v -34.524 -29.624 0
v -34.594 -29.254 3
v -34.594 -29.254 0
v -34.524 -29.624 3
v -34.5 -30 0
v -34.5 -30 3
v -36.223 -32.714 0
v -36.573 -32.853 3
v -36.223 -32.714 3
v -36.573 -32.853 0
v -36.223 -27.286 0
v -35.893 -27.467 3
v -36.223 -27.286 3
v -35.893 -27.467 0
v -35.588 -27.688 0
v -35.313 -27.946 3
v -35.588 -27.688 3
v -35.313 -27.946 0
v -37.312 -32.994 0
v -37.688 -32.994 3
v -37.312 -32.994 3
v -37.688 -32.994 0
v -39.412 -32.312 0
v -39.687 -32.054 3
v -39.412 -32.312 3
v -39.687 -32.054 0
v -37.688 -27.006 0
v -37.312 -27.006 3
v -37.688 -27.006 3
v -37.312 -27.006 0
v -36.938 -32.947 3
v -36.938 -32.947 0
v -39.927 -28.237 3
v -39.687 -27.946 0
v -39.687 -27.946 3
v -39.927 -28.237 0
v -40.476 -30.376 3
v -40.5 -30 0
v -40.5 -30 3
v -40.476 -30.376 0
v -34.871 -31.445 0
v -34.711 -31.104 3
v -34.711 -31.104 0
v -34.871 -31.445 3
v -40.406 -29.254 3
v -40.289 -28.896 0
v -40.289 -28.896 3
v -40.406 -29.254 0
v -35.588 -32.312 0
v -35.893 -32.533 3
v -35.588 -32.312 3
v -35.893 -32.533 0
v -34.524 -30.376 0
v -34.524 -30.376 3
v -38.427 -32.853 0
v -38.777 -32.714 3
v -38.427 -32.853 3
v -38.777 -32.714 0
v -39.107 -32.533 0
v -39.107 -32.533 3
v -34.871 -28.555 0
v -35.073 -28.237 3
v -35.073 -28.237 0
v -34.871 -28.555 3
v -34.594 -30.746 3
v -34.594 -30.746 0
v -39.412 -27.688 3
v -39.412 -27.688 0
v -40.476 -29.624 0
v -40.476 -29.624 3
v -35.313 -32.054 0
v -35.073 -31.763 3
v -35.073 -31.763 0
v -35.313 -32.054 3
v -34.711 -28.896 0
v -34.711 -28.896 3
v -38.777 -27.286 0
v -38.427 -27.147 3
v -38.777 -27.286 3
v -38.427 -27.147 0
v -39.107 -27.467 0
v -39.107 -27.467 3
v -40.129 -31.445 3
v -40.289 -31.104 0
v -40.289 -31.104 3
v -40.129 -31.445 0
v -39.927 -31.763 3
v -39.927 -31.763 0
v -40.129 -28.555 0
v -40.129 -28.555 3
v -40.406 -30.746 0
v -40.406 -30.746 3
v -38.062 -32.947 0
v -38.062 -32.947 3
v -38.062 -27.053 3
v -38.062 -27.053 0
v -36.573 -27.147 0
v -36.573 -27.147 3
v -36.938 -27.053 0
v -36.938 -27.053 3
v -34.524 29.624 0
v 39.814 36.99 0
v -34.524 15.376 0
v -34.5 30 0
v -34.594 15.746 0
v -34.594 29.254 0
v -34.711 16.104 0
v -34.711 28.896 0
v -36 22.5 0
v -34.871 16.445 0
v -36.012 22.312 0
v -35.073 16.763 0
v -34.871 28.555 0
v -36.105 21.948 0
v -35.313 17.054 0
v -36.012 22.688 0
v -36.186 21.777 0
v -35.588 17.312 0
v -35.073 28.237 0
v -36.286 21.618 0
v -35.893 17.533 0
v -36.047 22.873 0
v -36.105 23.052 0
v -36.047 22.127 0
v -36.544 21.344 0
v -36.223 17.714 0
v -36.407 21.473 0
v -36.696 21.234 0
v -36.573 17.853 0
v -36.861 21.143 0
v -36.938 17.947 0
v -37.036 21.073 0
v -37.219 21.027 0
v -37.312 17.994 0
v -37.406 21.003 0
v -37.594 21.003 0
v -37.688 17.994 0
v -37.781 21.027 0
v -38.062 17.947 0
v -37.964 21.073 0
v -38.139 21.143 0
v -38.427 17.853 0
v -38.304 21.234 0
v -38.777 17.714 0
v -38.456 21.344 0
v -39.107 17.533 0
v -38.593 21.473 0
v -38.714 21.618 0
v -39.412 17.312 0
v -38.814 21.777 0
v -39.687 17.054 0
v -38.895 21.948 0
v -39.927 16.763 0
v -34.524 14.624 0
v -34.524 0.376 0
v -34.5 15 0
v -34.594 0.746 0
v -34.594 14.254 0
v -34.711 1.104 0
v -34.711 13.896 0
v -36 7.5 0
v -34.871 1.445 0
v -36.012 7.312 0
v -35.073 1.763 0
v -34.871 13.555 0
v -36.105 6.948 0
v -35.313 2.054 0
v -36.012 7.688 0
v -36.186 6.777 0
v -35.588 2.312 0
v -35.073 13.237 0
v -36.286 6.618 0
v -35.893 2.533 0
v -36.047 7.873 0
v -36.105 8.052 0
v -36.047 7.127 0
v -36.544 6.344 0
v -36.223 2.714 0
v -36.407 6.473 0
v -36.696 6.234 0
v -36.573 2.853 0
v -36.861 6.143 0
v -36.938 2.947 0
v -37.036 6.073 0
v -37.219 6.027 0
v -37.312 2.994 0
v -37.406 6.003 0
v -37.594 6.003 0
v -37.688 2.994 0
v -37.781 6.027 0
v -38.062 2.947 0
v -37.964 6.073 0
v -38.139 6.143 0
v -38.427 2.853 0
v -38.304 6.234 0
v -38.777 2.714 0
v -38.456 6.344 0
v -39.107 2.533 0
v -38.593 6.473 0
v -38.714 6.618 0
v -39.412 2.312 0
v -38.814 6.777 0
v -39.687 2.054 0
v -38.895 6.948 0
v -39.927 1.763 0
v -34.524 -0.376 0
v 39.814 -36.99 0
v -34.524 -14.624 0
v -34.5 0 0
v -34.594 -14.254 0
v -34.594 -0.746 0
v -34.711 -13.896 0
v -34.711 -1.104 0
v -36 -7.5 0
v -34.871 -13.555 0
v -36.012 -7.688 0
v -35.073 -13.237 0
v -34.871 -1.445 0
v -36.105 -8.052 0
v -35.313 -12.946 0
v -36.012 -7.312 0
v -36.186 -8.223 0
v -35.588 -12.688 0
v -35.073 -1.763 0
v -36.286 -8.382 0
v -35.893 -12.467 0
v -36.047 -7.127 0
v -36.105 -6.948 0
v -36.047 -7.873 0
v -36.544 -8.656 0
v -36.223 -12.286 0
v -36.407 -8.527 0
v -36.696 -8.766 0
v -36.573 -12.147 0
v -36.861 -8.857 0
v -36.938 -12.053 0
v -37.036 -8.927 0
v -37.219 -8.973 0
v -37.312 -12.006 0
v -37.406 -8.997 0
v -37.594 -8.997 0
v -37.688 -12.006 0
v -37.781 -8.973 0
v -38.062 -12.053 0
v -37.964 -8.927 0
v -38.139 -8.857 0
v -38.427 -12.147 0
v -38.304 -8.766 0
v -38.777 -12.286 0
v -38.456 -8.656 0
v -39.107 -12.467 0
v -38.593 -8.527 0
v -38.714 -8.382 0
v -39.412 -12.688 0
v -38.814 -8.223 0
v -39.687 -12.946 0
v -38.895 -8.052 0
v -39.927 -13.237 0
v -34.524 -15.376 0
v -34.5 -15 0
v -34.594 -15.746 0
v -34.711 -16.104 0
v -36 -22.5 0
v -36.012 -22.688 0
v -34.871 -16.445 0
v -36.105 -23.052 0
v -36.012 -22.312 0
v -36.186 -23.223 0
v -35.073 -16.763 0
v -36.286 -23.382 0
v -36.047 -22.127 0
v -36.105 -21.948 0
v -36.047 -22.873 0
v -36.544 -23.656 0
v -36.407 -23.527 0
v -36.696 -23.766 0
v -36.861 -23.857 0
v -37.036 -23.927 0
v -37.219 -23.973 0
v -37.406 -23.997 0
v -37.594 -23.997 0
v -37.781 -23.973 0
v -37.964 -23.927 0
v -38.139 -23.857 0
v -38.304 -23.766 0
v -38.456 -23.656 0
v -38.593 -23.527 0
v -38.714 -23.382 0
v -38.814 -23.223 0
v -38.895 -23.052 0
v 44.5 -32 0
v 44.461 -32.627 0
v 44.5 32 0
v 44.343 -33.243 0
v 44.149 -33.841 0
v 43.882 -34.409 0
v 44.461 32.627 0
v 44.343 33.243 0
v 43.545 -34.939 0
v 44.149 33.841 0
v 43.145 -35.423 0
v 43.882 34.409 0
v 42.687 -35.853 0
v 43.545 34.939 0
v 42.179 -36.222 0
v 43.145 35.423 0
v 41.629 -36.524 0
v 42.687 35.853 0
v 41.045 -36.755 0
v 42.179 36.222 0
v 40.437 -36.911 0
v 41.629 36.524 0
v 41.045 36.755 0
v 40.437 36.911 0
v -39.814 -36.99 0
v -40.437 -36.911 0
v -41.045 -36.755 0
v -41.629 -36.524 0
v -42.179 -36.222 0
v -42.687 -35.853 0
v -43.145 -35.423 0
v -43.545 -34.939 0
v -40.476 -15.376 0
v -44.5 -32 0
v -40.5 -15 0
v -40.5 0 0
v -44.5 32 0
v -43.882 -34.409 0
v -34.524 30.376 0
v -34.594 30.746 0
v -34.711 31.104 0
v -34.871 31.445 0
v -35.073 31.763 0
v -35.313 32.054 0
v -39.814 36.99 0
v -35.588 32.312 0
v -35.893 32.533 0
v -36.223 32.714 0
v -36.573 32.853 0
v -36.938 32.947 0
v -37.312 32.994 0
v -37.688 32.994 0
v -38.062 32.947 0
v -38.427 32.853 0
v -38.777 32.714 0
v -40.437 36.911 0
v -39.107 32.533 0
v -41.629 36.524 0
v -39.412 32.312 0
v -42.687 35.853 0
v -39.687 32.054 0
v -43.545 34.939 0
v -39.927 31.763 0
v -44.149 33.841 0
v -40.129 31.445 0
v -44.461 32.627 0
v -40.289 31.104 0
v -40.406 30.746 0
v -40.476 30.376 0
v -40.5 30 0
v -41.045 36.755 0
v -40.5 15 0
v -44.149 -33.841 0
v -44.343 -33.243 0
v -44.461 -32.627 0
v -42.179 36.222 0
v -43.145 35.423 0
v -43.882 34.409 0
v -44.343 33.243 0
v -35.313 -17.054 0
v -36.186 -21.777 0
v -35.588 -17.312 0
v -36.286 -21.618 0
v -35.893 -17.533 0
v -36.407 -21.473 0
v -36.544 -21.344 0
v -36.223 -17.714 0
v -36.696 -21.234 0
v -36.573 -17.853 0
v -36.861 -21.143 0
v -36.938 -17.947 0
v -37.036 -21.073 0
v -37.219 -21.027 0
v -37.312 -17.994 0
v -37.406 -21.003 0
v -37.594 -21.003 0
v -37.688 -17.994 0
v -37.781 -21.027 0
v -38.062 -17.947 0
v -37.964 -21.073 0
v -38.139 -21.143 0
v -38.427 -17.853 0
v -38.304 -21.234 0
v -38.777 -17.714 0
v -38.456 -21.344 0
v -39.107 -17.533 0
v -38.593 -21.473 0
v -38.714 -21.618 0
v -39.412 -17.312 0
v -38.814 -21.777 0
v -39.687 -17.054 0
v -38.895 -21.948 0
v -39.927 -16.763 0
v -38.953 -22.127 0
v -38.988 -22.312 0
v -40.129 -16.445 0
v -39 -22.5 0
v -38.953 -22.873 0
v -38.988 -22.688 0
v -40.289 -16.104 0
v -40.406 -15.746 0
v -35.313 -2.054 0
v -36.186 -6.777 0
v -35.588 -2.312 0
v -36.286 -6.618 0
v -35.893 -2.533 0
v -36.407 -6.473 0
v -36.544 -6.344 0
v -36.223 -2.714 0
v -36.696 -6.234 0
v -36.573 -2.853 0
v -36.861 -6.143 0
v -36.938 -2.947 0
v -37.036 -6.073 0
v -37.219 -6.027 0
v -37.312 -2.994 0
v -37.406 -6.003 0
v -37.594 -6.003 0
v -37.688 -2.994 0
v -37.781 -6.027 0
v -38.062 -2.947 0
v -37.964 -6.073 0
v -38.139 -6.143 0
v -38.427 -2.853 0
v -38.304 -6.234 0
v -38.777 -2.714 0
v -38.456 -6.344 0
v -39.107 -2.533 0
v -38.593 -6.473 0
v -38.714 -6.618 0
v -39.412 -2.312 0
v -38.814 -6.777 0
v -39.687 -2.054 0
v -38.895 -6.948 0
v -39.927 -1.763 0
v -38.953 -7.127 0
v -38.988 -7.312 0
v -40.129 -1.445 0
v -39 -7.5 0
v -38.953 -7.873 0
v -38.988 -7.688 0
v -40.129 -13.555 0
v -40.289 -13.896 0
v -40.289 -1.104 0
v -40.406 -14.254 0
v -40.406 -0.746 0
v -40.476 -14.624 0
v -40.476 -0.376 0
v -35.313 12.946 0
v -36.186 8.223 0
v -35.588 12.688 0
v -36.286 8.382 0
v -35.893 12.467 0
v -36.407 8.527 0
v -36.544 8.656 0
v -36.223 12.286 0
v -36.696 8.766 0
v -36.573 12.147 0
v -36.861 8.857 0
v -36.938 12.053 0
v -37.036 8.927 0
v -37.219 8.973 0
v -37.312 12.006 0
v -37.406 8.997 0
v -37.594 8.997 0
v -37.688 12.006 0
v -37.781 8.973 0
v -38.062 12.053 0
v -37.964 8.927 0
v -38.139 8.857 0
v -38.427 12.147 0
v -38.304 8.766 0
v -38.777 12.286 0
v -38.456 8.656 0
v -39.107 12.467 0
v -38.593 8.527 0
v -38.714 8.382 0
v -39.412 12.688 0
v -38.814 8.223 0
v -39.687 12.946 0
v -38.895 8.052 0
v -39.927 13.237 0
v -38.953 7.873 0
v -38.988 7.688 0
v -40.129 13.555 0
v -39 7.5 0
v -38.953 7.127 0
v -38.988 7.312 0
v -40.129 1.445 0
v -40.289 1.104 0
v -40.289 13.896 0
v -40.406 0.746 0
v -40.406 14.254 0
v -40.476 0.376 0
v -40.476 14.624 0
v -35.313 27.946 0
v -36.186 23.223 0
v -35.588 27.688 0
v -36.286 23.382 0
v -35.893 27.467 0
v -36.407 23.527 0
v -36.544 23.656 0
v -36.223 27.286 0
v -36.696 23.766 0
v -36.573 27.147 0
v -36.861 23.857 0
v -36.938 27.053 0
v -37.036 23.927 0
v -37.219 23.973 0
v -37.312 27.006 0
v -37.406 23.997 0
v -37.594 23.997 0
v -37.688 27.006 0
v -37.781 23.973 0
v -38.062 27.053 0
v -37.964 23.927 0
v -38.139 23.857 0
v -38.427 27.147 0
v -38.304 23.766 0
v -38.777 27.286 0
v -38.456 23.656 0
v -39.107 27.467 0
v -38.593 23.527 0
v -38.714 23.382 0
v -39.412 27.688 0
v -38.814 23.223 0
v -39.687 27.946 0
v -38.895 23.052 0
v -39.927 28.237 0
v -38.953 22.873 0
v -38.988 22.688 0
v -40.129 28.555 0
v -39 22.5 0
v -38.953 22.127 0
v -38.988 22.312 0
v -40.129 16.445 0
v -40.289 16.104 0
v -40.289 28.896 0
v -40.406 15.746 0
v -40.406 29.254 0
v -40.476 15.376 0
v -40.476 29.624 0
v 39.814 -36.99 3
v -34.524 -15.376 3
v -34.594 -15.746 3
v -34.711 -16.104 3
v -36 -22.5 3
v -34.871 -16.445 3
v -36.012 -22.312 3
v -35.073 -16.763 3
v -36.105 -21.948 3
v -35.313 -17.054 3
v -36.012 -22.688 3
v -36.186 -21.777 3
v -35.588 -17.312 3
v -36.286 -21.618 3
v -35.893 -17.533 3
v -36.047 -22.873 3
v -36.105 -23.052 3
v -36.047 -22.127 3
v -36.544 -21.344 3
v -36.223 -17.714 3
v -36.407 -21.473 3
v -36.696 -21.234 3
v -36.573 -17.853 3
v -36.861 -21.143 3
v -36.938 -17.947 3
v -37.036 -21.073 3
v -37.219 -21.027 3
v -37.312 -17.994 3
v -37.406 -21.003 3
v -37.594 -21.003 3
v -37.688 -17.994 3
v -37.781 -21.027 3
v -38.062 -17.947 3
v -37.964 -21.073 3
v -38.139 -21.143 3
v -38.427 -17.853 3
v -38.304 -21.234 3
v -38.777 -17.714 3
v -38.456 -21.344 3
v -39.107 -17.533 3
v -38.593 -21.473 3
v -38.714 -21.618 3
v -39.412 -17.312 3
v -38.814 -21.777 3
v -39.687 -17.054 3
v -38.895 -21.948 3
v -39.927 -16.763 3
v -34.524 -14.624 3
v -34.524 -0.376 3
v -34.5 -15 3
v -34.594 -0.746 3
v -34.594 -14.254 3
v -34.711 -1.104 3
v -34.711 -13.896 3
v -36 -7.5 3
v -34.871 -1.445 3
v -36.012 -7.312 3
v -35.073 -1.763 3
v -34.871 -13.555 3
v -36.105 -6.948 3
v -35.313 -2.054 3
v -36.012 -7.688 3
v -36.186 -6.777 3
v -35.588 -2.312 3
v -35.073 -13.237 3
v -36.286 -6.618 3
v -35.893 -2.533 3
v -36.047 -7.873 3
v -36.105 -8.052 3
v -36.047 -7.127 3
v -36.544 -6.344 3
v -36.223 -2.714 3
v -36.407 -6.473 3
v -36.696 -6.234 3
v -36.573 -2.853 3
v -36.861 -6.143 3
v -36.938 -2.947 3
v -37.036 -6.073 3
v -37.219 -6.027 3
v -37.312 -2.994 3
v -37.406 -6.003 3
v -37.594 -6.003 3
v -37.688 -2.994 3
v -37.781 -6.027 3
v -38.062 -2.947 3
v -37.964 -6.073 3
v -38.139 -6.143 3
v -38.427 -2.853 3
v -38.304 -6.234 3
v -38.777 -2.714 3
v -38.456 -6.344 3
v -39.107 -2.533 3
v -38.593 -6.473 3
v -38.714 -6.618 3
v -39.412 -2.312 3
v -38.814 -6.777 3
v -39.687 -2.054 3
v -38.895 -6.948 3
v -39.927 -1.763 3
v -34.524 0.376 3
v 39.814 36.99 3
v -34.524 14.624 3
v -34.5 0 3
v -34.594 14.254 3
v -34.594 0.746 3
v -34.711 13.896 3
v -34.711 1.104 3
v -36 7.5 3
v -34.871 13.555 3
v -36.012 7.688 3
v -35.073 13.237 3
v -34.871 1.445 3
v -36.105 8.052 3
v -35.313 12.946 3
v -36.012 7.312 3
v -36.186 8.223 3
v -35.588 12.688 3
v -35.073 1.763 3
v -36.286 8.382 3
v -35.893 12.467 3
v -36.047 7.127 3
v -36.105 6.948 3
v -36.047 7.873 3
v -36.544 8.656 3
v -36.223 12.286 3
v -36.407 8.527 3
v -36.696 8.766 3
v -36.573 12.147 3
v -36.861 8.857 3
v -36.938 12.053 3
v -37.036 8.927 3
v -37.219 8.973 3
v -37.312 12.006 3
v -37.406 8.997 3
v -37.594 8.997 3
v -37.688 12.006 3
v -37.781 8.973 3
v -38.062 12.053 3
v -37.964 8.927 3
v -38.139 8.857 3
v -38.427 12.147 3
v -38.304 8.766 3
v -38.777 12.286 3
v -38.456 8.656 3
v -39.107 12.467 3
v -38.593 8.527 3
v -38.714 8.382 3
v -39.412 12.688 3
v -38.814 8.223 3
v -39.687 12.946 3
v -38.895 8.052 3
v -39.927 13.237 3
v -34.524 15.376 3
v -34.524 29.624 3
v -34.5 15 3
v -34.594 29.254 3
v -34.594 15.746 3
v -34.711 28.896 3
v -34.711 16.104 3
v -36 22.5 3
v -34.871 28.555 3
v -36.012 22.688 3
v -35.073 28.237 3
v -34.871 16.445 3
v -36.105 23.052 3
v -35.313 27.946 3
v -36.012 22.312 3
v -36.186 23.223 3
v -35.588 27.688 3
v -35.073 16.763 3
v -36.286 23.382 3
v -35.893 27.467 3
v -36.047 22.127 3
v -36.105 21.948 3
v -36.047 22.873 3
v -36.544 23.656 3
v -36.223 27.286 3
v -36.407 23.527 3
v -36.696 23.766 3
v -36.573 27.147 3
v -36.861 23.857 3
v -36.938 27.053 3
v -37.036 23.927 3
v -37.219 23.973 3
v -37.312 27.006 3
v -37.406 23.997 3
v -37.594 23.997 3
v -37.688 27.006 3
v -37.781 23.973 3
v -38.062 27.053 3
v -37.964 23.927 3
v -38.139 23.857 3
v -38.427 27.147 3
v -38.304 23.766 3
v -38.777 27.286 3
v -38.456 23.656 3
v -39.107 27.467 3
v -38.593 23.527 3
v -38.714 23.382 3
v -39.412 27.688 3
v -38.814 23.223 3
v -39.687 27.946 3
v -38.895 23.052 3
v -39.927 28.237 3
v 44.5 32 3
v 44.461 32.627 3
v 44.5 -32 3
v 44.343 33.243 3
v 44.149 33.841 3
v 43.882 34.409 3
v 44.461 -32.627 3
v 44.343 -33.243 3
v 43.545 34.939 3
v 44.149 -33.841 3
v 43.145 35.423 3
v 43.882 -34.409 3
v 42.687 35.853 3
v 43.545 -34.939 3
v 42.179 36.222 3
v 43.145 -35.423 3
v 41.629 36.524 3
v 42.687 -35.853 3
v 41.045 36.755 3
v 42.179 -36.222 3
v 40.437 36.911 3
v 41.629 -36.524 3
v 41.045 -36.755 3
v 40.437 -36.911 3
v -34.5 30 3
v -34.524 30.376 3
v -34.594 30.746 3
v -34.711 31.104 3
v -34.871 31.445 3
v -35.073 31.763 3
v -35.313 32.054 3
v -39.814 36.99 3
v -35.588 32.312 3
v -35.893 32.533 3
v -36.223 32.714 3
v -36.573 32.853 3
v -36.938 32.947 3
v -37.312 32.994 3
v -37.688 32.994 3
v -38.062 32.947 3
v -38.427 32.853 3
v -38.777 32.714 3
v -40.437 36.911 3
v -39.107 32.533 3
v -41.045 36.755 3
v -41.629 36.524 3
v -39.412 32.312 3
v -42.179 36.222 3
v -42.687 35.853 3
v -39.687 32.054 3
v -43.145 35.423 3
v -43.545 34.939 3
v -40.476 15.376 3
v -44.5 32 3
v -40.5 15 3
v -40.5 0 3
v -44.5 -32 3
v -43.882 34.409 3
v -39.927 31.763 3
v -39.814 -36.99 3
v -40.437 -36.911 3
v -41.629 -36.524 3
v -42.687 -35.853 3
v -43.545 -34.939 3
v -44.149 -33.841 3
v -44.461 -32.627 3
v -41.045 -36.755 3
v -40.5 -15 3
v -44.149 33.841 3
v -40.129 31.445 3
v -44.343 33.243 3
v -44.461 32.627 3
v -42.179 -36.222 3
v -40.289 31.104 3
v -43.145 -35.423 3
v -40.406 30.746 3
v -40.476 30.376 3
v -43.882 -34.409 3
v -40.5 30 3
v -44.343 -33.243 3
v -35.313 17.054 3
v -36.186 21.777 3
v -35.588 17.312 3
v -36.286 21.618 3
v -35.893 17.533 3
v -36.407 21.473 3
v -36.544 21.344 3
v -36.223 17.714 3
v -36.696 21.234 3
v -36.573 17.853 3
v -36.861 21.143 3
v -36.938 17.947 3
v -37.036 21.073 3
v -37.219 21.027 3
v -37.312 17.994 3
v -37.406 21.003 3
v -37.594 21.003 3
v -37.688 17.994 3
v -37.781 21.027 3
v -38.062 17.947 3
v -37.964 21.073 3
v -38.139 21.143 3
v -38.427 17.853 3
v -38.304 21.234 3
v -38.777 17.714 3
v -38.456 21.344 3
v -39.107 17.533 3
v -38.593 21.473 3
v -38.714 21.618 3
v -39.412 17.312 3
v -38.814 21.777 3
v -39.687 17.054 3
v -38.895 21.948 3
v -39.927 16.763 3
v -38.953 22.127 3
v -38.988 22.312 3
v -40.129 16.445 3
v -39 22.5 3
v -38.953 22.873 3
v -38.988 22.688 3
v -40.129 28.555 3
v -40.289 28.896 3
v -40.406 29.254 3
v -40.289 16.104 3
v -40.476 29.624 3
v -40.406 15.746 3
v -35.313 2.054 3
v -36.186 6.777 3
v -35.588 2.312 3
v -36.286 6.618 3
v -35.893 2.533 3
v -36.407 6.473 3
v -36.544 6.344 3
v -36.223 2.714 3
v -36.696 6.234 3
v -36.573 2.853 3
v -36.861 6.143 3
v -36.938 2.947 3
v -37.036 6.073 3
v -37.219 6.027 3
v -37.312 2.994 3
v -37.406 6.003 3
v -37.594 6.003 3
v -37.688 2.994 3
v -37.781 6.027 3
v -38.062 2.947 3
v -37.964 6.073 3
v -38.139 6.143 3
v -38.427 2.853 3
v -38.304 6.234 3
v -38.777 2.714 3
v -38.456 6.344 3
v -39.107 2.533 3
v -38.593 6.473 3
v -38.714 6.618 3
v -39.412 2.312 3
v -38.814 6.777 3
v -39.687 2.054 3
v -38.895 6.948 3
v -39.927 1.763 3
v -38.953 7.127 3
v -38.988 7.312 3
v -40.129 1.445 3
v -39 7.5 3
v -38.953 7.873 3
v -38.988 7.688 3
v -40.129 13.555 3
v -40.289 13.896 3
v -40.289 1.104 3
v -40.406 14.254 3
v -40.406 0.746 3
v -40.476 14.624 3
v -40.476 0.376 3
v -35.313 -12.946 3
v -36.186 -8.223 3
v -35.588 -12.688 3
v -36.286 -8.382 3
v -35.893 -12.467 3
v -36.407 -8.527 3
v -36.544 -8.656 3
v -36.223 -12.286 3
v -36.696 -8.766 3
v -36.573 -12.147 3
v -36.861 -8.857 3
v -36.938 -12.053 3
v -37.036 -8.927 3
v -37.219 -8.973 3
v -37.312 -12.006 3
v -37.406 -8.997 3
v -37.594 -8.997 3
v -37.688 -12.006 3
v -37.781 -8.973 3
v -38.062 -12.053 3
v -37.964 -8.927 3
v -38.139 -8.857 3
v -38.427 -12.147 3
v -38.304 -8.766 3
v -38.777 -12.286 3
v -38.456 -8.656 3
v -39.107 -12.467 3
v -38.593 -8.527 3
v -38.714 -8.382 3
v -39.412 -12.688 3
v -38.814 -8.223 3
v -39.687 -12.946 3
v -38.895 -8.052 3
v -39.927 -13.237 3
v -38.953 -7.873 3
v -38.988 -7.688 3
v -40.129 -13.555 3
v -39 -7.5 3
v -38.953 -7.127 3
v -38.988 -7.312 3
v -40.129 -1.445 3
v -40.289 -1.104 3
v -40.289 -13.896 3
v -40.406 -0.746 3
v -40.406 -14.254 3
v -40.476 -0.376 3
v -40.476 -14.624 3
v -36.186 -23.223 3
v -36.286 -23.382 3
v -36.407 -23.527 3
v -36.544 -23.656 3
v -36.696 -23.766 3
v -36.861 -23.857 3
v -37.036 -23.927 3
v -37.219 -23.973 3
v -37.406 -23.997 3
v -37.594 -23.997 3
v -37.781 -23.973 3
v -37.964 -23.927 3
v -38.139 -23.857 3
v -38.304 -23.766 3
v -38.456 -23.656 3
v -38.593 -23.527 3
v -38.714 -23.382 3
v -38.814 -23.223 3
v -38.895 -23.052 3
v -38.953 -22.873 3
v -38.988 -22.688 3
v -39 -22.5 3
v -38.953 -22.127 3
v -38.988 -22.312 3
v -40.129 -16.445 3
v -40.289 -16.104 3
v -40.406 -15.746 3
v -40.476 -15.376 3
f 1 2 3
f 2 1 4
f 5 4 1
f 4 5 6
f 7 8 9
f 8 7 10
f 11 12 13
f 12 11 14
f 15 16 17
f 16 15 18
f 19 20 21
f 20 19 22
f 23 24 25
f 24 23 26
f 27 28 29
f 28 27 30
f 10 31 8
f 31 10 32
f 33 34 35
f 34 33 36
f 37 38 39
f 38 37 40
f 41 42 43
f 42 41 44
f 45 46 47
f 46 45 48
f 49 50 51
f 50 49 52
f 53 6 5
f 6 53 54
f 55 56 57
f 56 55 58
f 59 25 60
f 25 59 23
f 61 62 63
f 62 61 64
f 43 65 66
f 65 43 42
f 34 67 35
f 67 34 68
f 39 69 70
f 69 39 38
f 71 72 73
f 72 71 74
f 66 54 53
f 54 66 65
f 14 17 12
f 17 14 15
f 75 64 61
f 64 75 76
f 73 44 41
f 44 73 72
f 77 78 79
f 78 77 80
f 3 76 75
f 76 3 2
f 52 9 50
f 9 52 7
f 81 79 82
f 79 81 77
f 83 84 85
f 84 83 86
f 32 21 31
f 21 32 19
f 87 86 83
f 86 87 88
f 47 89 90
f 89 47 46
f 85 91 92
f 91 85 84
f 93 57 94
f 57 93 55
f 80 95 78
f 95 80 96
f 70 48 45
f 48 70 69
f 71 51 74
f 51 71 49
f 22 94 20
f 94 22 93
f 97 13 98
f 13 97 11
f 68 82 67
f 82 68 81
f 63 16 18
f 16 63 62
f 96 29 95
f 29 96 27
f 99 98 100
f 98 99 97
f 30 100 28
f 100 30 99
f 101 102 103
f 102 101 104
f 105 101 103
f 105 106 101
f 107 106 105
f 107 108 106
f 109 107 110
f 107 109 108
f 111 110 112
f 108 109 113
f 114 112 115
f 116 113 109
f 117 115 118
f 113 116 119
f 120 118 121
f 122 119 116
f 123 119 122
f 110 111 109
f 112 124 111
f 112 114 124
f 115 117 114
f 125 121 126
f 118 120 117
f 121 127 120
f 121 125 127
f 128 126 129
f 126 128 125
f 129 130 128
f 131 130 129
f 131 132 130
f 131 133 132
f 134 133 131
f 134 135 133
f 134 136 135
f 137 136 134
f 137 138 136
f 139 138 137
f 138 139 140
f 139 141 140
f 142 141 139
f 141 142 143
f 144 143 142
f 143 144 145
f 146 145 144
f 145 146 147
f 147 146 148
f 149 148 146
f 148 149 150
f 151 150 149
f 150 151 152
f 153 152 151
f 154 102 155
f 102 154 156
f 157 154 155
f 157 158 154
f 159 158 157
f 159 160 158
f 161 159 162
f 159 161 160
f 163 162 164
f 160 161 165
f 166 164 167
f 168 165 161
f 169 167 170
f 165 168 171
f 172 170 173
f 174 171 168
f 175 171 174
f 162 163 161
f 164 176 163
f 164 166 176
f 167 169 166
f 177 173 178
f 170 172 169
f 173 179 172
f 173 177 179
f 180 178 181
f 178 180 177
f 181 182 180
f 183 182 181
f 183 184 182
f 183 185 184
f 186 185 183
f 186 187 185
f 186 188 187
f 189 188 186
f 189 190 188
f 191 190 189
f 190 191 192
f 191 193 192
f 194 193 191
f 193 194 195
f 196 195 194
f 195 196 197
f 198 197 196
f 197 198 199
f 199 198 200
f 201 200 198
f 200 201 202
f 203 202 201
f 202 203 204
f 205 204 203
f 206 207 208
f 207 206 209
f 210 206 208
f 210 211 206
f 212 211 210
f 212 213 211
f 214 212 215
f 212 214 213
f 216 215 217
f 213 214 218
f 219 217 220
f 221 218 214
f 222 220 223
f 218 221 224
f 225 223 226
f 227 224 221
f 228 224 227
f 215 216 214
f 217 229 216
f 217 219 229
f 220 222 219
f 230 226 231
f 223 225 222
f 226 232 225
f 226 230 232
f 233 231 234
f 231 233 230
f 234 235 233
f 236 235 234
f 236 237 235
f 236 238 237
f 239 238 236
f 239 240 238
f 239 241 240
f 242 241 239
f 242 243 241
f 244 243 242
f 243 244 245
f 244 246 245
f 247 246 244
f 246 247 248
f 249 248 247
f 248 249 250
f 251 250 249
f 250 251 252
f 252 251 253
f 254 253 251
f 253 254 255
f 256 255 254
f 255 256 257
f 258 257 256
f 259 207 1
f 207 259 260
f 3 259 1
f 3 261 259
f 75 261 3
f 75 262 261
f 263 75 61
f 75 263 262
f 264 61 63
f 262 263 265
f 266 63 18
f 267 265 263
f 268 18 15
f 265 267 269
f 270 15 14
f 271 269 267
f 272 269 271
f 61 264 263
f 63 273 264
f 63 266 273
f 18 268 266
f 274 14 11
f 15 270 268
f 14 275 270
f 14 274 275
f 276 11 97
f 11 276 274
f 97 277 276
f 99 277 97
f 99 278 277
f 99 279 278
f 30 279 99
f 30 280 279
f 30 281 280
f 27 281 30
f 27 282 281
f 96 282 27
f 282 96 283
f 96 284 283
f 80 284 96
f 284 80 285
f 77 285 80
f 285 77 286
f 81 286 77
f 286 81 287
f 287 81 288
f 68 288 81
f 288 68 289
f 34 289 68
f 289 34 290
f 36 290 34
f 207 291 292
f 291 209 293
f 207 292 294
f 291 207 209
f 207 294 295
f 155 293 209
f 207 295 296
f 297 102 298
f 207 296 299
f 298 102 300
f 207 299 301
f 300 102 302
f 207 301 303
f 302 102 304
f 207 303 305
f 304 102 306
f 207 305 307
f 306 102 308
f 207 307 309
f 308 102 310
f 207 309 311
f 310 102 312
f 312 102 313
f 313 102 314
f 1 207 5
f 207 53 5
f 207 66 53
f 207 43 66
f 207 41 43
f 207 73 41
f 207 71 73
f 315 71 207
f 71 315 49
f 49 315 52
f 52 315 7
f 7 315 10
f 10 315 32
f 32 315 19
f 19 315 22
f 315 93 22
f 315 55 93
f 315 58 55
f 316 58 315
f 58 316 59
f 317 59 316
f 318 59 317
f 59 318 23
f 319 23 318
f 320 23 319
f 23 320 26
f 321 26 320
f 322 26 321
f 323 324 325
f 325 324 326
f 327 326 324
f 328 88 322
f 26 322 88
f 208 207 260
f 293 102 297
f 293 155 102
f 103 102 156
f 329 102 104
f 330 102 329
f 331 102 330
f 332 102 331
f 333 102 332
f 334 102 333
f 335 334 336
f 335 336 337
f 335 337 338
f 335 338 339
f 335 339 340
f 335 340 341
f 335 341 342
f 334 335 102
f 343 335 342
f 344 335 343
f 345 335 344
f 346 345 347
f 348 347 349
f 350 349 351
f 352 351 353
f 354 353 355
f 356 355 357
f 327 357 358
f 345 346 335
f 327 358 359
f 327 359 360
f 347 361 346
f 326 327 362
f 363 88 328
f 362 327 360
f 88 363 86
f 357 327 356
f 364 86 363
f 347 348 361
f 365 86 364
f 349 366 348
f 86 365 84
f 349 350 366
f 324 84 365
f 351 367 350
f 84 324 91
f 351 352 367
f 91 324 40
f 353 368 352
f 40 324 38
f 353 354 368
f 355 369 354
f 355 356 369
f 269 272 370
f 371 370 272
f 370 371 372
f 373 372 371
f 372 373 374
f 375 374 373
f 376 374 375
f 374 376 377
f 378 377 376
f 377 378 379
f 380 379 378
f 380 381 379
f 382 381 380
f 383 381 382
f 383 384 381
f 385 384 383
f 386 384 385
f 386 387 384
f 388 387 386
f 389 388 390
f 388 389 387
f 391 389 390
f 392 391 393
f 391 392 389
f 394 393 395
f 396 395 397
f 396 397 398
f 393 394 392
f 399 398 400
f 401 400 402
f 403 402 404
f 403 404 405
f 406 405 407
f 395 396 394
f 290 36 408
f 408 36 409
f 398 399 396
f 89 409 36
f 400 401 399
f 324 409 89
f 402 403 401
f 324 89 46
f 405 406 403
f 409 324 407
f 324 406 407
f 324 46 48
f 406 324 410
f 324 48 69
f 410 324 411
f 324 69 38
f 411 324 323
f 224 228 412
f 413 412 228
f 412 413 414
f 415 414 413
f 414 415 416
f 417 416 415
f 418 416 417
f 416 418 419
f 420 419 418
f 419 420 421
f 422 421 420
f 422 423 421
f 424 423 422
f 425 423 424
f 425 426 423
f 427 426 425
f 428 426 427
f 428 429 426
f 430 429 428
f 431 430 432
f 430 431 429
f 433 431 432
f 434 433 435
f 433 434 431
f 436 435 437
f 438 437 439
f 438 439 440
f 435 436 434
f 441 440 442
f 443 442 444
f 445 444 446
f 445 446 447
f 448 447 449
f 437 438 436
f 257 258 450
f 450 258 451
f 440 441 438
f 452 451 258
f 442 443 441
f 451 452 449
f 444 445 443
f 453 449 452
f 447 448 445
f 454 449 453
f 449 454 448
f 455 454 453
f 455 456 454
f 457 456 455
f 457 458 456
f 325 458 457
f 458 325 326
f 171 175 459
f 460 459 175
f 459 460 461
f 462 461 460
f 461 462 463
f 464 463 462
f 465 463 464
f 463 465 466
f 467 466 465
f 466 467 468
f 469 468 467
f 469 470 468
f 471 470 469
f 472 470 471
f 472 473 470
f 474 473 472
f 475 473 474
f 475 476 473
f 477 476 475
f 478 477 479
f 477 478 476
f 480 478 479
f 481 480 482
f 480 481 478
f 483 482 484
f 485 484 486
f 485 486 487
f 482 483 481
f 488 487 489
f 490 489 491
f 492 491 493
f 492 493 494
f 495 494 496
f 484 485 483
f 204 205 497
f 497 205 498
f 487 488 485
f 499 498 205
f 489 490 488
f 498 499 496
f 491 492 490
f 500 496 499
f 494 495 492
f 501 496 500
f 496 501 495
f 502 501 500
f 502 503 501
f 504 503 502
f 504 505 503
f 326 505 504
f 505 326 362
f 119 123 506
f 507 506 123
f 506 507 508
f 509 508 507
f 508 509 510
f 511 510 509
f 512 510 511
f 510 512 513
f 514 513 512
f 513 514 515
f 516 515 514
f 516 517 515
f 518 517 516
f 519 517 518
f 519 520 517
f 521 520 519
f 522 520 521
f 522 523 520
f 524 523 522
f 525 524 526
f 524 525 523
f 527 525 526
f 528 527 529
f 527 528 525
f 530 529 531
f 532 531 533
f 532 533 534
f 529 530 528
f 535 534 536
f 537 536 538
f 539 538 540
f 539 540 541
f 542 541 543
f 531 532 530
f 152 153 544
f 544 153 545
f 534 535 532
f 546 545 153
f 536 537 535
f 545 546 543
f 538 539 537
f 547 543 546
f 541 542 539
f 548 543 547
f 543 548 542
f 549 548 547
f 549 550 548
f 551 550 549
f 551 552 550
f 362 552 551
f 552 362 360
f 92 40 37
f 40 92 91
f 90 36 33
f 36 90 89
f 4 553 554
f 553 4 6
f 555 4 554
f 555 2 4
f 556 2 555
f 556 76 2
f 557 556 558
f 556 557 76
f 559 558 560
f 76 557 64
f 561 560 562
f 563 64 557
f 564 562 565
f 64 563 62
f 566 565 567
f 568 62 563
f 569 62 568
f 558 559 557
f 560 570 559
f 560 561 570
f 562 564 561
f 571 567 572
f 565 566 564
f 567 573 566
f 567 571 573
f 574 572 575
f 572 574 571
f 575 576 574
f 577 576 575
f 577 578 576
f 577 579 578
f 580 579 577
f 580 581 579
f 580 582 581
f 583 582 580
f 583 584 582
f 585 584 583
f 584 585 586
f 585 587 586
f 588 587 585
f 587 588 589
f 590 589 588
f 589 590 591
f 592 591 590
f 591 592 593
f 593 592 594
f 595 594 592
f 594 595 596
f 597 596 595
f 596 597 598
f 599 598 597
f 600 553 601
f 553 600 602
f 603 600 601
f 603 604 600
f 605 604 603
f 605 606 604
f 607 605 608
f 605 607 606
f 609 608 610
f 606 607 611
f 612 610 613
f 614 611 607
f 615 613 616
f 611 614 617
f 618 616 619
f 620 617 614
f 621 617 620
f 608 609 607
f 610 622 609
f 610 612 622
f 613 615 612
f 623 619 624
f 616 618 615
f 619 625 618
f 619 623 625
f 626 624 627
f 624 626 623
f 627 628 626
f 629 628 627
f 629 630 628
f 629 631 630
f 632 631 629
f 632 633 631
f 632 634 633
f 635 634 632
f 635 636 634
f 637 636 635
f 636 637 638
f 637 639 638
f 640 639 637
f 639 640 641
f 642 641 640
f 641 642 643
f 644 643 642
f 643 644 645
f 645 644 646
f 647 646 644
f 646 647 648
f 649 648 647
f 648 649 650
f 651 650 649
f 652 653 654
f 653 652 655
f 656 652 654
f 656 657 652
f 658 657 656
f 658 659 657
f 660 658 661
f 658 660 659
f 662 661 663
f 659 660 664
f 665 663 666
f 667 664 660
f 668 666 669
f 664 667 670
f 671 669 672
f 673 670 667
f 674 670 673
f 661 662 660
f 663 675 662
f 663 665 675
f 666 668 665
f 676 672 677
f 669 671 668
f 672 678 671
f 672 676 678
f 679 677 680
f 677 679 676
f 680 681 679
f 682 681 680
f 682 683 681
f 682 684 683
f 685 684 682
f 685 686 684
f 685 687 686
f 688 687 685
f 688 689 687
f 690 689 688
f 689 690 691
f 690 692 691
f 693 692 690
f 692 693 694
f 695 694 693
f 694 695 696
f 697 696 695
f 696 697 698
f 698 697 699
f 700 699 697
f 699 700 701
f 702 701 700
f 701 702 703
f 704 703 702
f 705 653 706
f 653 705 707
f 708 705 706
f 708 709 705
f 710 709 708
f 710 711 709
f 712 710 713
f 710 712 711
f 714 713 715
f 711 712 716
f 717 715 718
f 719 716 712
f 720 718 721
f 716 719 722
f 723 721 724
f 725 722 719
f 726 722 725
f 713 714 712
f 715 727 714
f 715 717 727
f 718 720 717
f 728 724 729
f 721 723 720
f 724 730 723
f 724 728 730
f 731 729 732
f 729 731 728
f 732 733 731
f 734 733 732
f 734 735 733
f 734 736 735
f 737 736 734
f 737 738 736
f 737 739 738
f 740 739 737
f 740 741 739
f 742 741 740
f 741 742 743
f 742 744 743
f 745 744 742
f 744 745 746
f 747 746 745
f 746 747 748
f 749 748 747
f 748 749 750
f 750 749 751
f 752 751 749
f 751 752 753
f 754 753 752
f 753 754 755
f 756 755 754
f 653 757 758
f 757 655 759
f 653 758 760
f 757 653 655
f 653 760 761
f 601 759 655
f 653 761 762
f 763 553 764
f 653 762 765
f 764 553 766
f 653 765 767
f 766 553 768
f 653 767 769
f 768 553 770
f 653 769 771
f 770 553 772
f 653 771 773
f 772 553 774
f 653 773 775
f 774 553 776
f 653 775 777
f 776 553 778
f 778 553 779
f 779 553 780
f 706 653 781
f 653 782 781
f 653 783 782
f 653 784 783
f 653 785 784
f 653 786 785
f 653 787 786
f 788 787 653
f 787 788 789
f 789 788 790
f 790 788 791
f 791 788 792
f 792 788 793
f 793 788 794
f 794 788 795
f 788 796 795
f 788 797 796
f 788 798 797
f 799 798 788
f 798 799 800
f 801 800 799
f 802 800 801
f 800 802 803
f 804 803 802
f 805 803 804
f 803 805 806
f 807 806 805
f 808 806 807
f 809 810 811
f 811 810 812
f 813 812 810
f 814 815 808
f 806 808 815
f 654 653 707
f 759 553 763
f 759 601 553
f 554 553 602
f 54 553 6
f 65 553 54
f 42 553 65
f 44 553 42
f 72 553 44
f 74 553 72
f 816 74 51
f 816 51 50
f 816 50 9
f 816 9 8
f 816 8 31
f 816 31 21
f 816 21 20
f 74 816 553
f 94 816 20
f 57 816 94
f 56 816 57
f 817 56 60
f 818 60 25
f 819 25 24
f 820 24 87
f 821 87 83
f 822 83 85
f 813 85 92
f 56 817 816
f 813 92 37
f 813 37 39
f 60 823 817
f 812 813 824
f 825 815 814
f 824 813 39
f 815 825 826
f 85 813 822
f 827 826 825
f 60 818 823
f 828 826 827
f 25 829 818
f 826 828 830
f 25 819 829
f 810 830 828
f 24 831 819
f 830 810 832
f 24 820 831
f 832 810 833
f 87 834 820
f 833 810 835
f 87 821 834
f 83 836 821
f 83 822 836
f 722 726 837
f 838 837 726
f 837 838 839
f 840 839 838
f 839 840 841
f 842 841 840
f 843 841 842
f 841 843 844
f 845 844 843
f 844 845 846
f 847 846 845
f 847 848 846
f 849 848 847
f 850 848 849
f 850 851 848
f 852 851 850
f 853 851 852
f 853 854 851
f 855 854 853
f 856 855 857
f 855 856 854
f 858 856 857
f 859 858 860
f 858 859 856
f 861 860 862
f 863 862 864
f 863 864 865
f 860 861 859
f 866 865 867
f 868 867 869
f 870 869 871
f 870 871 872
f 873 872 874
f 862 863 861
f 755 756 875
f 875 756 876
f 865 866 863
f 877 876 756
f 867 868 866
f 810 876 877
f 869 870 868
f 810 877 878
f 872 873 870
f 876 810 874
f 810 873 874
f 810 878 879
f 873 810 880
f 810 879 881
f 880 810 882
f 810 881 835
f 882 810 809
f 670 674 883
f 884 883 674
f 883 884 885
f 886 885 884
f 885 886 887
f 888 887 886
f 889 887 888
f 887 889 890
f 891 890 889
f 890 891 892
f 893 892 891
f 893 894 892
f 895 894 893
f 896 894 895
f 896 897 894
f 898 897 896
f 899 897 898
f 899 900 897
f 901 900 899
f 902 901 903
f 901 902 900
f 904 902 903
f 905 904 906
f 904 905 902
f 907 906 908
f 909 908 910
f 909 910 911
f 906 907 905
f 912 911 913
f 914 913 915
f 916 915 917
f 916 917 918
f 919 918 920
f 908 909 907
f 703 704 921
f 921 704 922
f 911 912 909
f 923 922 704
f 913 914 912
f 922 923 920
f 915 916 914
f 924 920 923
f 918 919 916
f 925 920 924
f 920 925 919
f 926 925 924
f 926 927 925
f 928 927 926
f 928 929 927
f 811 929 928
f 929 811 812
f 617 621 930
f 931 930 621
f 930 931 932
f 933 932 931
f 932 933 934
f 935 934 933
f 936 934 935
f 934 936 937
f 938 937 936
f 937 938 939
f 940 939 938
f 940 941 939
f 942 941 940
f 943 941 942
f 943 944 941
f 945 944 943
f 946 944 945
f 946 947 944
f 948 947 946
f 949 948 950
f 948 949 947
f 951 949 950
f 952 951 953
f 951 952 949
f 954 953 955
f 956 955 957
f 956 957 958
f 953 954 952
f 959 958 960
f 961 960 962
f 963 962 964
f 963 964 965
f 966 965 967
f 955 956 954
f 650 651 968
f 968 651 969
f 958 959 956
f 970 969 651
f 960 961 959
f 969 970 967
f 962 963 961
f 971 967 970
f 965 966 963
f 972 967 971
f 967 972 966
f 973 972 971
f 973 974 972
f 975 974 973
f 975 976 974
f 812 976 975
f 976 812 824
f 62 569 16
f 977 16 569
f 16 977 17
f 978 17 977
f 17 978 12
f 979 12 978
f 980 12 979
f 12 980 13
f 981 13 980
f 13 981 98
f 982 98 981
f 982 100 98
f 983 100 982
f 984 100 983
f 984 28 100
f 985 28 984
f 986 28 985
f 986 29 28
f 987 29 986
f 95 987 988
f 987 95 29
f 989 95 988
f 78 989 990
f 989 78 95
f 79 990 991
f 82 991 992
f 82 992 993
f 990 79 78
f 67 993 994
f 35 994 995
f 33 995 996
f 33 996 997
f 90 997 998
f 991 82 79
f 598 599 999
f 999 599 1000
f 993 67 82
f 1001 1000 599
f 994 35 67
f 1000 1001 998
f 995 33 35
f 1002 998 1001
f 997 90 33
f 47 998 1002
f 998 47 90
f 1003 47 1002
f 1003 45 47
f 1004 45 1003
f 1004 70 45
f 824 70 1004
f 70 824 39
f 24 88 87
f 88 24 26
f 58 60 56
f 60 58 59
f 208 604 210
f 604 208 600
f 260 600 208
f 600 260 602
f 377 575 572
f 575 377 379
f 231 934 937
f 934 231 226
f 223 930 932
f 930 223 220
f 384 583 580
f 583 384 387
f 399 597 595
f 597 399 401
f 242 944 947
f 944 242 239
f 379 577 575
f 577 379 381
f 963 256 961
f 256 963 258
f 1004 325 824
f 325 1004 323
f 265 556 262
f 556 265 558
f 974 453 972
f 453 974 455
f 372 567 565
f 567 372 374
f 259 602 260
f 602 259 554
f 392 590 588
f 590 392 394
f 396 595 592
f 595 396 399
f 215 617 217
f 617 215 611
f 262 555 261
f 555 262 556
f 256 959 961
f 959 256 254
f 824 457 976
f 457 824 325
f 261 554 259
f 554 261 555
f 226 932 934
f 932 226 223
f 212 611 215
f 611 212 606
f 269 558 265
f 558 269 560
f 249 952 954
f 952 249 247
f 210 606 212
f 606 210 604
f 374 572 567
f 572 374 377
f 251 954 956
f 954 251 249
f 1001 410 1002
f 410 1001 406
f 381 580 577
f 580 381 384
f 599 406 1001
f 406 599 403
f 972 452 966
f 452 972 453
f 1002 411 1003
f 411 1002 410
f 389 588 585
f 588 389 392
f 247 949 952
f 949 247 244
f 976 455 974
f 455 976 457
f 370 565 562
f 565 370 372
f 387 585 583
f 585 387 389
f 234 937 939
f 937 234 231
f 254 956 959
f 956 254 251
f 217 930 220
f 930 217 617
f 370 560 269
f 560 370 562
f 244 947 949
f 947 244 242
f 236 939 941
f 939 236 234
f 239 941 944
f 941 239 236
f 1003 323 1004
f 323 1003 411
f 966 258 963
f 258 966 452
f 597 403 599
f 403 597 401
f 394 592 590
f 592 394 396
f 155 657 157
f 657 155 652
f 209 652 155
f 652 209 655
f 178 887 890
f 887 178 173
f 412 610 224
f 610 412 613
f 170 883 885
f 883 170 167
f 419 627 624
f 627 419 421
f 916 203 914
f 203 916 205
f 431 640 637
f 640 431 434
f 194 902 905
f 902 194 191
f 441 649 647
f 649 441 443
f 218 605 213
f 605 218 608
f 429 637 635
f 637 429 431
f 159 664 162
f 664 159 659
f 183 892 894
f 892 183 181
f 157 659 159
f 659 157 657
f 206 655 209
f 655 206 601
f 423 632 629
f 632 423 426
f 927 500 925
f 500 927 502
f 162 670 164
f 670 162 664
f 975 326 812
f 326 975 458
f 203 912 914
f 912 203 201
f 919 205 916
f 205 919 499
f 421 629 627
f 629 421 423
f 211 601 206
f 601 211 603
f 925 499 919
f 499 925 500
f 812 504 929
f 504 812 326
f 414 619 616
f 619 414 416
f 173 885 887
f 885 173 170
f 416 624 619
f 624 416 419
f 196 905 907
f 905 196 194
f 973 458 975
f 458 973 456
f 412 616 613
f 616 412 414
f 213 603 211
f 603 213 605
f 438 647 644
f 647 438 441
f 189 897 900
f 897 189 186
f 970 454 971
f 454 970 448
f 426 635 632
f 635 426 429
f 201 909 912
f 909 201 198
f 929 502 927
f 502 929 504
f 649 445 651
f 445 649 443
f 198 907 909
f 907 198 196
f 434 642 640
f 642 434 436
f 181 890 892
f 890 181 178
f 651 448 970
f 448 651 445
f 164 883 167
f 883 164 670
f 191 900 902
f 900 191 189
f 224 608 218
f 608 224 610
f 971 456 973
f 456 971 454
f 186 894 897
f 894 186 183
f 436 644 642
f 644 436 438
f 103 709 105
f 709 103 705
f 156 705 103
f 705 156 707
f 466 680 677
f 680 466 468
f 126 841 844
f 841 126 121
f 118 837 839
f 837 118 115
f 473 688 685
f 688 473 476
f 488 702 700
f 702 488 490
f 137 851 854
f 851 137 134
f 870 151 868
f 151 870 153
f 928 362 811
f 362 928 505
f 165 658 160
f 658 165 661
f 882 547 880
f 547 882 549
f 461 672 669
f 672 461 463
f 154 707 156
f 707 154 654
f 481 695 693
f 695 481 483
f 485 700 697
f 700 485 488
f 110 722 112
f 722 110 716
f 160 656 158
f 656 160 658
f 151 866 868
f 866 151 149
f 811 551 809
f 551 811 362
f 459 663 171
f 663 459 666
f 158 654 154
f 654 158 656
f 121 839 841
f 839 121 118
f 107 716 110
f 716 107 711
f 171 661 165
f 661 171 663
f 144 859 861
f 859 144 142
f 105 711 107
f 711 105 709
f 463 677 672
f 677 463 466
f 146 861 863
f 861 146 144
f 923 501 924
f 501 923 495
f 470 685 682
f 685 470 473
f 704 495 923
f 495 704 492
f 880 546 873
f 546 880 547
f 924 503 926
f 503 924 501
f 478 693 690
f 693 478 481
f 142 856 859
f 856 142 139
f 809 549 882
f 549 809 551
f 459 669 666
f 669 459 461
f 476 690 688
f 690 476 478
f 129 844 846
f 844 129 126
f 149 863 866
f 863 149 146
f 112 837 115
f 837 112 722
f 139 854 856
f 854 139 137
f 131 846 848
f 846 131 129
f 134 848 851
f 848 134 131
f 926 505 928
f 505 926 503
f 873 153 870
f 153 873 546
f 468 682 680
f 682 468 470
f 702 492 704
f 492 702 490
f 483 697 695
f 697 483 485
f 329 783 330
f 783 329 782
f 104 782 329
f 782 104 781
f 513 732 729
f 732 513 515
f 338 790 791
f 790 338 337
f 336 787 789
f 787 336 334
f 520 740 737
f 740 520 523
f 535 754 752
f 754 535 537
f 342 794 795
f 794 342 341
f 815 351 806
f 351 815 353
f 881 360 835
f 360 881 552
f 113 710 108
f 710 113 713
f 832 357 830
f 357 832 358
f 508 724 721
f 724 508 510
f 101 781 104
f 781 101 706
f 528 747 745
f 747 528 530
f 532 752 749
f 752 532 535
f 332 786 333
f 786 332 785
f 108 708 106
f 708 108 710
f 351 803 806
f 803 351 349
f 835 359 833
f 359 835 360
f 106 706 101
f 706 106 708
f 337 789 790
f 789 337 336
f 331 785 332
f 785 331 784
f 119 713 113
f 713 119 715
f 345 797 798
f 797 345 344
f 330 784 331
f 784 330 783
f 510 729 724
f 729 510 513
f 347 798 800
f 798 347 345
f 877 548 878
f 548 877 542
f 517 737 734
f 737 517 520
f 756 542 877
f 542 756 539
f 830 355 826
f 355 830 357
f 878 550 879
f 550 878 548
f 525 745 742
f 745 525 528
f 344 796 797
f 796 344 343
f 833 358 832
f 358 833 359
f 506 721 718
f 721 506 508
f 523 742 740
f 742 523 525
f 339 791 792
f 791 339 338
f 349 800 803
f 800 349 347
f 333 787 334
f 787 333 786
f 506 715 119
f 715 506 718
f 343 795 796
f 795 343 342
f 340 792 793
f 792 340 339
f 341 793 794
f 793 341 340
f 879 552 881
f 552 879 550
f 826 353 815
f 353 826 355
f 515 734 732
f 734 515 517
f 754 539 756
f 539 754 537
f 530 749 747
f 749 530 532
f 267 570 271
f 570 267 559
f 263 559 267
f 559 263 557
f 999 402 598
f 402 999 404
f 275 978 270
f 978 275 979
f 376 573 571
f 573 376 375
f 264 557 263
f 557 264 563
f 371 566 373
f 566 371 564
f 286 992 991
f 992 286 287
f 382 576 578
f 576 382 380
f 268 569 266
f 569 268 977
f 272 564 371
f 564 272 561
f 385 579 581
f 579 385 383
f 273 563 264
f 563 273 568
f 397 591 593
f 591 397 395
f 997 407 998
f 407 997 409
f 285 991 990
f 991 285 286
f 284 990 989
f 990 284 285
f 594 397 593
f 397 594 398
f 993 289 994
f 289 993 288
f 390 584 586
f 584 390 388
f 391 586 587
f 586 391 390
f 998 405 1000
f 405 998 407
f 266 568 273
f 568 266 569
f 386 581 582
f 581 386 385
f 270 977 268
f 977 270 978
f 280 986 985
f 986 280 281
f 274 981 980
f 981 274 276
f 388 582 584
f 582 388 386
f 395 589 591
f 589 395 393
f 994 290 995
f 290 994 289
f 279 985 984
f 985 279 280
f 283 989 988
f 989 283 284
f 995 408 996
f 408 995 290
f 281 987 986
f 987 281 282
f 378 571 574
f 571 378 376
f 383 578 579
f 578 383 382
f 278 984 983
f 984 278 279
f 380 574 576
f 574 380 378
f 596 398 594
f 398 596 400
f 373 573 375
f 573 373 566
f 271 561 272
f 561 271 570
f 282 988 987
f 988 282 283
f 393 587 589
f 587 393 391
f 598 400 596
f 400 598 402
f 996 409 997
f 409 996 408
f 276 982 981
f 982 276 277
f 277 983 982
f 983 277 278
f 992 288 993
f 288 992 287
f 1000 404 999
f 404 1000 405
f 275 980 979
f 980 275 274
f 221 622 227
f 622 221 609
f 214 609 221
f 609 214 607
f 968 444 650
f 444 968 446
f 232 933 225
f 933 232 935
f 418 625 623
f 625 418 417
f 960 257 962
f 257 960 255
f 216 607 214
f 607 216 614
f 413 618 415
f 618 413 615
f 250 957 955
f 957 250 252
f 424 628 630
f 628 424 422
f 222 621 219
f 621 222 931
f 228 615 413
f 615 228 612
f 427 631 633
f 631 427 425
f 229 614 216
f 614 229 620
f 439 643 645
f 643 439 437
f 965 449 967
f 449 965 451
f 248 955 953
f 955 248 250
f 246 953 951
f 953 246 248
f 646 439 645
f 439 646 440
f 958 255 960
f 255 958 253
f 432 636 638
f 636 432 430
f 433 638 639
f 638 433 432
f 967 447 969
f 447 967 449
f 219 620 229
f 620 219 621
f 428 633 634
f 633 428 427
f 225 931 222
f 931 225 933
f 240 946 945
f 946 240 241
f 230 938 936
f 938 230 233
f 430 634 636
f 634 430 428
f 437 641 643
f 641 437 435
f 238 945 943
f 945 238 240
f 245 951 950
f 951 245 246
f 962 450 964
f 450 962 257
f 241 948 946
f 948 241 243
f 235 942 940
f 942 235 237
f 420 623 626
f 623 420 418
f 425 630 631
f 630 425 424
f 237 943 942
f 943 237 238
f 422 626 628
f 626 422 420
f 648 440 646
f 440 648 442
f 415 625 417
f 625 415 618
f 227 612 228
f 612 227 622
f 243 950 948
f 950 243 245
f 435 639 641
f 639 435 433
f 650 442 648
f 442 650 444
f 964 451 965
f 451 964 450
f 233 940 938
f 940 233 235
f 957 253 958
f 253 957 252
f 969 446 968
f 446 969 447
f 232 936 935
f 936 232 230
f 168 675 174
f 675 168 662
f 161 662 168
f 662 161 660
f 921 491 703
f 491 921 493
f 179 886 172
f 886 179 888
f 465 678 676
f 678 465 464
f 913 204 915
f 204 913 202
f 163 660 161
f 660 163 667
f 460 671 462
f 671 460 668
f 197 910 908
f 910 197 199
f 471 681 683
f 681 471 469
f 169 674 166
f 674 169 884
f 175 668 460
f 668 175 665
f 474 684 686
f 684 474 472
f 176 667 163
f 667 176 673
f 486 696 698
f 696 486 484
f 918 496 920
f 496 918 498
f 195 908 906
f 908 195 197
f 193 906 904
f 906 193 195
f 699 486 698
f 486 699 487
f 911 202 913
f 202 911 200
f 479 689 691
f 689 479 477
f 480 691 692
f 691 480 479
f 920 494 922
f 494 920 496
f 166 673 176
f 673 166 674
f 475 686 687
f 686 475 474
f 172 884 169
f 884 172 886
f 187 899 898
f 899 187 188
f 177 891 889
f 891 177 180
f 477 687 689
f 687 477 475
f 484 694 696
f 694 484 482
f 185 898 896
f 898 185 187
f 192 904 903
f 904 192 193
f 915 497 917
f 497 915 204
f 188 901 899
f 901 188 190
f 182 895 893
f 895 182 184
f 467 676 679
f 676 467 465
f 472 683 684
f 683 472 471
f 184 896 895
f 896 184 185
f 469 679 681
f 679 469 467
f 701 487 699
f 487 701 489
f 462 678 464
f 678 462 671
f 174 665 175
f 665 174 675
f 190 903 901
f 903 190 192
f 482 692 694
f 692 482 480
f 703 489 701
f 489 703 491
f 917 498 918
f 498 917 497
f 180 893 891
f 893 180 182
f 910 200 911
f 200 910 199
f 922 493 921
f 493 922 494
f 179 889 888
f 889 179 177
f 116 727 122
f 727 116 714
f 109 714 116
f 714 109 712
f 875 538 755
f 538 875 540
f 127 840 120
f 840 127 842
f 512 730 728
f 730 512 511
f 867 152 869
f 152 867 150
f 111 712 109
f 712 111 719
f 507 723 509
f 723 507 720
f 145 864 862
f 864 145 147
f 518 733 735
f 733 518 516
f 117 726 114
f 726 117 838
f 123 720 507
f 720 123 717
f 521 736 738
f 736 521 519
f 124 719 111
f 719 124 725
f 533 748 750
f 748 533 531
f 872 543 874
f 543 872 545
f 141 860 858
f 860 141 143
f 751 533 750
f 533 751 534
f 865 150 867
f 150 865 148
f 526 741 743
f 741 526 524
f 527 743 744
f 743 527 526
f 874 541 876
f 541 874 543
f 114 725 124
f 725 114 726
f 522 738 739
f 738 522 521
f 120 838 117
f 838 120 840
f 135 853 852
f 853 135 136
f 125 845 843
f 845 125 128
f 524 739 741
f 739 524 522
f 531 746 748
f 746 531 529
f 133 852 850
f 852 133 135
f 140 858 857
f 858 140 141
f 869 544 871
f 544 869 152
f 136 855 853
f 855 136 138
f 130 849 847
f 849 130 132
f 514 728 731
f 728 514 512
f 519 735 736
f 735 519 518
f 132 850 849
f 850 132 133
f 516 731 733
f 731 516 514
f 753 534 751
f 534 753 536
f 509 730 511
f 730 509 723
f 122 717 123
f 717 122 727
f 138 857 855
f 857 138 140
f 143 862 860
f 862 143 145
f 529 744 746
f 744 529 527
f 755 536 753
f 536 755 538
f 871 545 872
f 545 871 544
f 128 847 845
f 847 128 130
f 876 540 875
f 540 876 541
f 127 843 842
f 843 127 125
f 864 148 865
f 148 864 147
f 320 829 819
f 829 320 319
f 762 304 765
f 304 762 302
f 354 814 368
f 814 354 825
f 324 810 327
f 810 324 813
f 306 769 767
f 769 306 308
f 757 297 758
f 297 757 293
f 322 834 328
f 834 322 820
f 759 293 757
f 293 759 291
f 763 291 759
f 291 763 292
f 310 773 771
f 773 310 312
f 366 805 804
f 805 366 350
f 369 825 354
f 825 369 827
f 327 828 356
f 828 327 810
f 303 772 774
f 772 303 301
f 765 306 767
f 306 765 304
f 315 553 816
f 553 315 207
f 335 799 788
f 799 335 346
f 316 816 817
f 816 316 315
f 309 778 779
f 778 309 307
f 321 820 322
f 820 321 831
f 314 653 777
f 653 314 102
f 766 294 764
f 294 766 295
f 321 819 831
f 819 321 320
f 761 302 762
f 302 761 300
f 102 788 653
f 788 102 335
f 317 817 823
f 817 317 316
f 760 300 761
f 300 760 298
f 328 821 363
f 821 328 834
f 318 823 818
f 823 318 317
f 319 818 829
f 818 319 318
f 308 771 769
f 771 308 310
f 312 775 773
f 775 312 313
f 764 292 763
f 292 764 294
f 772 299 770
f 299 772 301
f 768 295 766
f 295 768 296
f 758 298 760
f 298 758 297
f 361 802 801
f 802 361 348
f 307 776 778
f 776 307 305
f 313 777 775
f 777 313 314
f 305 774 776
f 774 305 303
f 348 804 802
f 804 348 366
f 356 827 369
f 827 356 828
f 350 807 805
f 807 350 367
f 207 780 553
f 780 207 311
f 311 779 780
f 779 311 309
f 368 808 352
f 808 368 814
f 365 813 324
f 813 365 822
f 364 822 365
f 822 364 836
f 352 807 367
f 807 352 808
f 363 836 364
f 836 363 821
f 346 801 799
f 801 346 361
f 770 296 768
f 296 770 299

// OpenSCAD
$fn = 50;


difference() {
	union() {
		hull() {
			translate(v = [-39.5000000000, 32.0000000000, 0]) {
				cylinder(h = 3, r = 5);
			}
			translate(v = [39.5000000000, 32.0000000000, 0]) {
				cylinder(h = 3, r = 5);
			}
			translate(v = [-39.5000000000, -32.0000000000, 0]) {
				cylinder(h = 3, r = 5);
			}
			translate(v = [39.5000000000, -32.0000000000, 0]) {
				cylinder(h = 3, r = 5);
			}
		}
	}
	union() {
		translate(v = [-37.5000000000, -30.0000000000, 0]) {
			cylinder(h = 3, r = 3.0000000000);
		}
		translate(v = [-37.5000000000, -15.0000000000, 0]) {
			cylinder(h = 3, r = 3.0000000000);
		}
		translate(v = [-37.5000000000, 0.0000000000, 0]) {
			cylinder(h = 3, r = 3.0000000000);
		}
		translate(v = [-37.5000000000, 15.0000000000, 0]) {
			cylinder(h = 3, r = 3.0000000000);
		}
		translate(v = [-37.5000000000, 30.0000000000, 0]) {
			cylinder(h = 3, r = 3.0000000000);
		}
		translate(v = [-37.5000000000, -30.0000000000, 0]) {
			cylinder(h = 3, r = 1.5000000000);
		}
		translate(v = [-37.5000000000, -22.5000000000, 0]) {
			cylinder(h = 3, r = 1.5000000000);
		}
		translate(v = [-37.5000000000, -15.0000000000, 0]) {
			cylinder(h = 3, r = 1.5000000000);
		}
		translate(v = [-37.5000000000, -7.5000000000, 0]) {
			cylinder(h = 3, r = 1.5000000000);
		}
		translate(v = [-37.5000000000, 0.0000000000, 0]) {
			cylinder(h = 3, r = 1.5000000000);
		}
		translate(v = [-37.5000000000, 7.5000000000, 0]) {
			cylinder(h = 3, r = 1.5000000000);
		}
		translate(v = [-37.5000000000, 15.0000000000, 0]) {
			cylinder(h = 3, r = 1.5000000000);
		}
		translate(v = [-37.5000000000, 22.5000000000, 0]) {
			cylinder(h = 3, r = 1.5000000000);
		}
		translate(v = [-37.5000000000, 30.0000000000, 0]) {
			cylinder(h = 3, r = 1.5000000000);
		}
		translate(v = [-37.5000000000, -30.0000000000, 0]) {
			cylinder(h = 3, r = 1.5000000000);
		}
		translate(v = [-37.5000000000, -22.5000000000, 0]) {
			cylinder(h = 3, r = 1.5000000000);
		}
		translate(v = [-37.5000000000, -15.0000000000, 0]) {
			cylinder(h = 3, r = 1.5000000000);
		}
		translate(v = [-37.5000000000, -7.5000000000, 0]) {
			cylinder(h = 3, r = 1.5000000000);
		}
		translate(v = [-37.5000000000, 0.0000000000, 0]) {
			cylinder(h = 3, r = 1.5000000000);
		}
		translate(v = [-37.5000000000, 7.5000000000, 0]) {
			cylinder(h = 3, r = 1.5000000000);
		}
		translate(v = [-37.5000000000, 15.0000000000, 0]) {
			cylinder(h = 3, r = 1.5000000000);
		}
		translate(v = [-37.5000000000, 22.5000000000, 0]) {
			cylinder(h = 3, r = 1.5000000000);
		}
		translate(v = [-37.5000000000, 30.0000000000, 0]) {
			cylinder(h = 3, r = 1.5000000000);
		}
		translate(v = [-37.5000000000, -30.0000000000, 0]) {
			cylinder(h = 3, r = 1.5000000000);
		}
		translate(v = [-37.5000000000, -22.5000000000, 0]) {
			cylinder(h = 3, r = 1.5000000000);
		}
		translate(v = [-37.5000000000, -15.0000000000, 0]) {
			cylinder(h = 3, r = 1.5000000000);
		}
		translate(v = [-37.5000000000, -7.5000000000, 0]) {
			cylinder(h = 3, r = 1.5000000000);
		}
		translate(v = [-37.5000000000, 0.0000000000, 0]) {
			cylinder(h = 3, r = 1.5000000000);
		}
		translate(v = [-37.5000000000, 7.5000000000, 0]) {
			cylinder(h = 3, r = 1.5000000000);
		}
		translate(v = [-37.5000000000, 15.0000000000, 0]) {
			cylinder(h = 3, r = 1.5000000000);
		}
		translate(v = [-37.5000000000, 22.5000000000, 0]) {
			cylinder(h = 3, r = 1.5000000000);
		}
		translate(v = [-37.5000000000, 30.0000000000, 0]) {
			cylinder(h = 3, r = 1.5000000000);
		}
	}
}
